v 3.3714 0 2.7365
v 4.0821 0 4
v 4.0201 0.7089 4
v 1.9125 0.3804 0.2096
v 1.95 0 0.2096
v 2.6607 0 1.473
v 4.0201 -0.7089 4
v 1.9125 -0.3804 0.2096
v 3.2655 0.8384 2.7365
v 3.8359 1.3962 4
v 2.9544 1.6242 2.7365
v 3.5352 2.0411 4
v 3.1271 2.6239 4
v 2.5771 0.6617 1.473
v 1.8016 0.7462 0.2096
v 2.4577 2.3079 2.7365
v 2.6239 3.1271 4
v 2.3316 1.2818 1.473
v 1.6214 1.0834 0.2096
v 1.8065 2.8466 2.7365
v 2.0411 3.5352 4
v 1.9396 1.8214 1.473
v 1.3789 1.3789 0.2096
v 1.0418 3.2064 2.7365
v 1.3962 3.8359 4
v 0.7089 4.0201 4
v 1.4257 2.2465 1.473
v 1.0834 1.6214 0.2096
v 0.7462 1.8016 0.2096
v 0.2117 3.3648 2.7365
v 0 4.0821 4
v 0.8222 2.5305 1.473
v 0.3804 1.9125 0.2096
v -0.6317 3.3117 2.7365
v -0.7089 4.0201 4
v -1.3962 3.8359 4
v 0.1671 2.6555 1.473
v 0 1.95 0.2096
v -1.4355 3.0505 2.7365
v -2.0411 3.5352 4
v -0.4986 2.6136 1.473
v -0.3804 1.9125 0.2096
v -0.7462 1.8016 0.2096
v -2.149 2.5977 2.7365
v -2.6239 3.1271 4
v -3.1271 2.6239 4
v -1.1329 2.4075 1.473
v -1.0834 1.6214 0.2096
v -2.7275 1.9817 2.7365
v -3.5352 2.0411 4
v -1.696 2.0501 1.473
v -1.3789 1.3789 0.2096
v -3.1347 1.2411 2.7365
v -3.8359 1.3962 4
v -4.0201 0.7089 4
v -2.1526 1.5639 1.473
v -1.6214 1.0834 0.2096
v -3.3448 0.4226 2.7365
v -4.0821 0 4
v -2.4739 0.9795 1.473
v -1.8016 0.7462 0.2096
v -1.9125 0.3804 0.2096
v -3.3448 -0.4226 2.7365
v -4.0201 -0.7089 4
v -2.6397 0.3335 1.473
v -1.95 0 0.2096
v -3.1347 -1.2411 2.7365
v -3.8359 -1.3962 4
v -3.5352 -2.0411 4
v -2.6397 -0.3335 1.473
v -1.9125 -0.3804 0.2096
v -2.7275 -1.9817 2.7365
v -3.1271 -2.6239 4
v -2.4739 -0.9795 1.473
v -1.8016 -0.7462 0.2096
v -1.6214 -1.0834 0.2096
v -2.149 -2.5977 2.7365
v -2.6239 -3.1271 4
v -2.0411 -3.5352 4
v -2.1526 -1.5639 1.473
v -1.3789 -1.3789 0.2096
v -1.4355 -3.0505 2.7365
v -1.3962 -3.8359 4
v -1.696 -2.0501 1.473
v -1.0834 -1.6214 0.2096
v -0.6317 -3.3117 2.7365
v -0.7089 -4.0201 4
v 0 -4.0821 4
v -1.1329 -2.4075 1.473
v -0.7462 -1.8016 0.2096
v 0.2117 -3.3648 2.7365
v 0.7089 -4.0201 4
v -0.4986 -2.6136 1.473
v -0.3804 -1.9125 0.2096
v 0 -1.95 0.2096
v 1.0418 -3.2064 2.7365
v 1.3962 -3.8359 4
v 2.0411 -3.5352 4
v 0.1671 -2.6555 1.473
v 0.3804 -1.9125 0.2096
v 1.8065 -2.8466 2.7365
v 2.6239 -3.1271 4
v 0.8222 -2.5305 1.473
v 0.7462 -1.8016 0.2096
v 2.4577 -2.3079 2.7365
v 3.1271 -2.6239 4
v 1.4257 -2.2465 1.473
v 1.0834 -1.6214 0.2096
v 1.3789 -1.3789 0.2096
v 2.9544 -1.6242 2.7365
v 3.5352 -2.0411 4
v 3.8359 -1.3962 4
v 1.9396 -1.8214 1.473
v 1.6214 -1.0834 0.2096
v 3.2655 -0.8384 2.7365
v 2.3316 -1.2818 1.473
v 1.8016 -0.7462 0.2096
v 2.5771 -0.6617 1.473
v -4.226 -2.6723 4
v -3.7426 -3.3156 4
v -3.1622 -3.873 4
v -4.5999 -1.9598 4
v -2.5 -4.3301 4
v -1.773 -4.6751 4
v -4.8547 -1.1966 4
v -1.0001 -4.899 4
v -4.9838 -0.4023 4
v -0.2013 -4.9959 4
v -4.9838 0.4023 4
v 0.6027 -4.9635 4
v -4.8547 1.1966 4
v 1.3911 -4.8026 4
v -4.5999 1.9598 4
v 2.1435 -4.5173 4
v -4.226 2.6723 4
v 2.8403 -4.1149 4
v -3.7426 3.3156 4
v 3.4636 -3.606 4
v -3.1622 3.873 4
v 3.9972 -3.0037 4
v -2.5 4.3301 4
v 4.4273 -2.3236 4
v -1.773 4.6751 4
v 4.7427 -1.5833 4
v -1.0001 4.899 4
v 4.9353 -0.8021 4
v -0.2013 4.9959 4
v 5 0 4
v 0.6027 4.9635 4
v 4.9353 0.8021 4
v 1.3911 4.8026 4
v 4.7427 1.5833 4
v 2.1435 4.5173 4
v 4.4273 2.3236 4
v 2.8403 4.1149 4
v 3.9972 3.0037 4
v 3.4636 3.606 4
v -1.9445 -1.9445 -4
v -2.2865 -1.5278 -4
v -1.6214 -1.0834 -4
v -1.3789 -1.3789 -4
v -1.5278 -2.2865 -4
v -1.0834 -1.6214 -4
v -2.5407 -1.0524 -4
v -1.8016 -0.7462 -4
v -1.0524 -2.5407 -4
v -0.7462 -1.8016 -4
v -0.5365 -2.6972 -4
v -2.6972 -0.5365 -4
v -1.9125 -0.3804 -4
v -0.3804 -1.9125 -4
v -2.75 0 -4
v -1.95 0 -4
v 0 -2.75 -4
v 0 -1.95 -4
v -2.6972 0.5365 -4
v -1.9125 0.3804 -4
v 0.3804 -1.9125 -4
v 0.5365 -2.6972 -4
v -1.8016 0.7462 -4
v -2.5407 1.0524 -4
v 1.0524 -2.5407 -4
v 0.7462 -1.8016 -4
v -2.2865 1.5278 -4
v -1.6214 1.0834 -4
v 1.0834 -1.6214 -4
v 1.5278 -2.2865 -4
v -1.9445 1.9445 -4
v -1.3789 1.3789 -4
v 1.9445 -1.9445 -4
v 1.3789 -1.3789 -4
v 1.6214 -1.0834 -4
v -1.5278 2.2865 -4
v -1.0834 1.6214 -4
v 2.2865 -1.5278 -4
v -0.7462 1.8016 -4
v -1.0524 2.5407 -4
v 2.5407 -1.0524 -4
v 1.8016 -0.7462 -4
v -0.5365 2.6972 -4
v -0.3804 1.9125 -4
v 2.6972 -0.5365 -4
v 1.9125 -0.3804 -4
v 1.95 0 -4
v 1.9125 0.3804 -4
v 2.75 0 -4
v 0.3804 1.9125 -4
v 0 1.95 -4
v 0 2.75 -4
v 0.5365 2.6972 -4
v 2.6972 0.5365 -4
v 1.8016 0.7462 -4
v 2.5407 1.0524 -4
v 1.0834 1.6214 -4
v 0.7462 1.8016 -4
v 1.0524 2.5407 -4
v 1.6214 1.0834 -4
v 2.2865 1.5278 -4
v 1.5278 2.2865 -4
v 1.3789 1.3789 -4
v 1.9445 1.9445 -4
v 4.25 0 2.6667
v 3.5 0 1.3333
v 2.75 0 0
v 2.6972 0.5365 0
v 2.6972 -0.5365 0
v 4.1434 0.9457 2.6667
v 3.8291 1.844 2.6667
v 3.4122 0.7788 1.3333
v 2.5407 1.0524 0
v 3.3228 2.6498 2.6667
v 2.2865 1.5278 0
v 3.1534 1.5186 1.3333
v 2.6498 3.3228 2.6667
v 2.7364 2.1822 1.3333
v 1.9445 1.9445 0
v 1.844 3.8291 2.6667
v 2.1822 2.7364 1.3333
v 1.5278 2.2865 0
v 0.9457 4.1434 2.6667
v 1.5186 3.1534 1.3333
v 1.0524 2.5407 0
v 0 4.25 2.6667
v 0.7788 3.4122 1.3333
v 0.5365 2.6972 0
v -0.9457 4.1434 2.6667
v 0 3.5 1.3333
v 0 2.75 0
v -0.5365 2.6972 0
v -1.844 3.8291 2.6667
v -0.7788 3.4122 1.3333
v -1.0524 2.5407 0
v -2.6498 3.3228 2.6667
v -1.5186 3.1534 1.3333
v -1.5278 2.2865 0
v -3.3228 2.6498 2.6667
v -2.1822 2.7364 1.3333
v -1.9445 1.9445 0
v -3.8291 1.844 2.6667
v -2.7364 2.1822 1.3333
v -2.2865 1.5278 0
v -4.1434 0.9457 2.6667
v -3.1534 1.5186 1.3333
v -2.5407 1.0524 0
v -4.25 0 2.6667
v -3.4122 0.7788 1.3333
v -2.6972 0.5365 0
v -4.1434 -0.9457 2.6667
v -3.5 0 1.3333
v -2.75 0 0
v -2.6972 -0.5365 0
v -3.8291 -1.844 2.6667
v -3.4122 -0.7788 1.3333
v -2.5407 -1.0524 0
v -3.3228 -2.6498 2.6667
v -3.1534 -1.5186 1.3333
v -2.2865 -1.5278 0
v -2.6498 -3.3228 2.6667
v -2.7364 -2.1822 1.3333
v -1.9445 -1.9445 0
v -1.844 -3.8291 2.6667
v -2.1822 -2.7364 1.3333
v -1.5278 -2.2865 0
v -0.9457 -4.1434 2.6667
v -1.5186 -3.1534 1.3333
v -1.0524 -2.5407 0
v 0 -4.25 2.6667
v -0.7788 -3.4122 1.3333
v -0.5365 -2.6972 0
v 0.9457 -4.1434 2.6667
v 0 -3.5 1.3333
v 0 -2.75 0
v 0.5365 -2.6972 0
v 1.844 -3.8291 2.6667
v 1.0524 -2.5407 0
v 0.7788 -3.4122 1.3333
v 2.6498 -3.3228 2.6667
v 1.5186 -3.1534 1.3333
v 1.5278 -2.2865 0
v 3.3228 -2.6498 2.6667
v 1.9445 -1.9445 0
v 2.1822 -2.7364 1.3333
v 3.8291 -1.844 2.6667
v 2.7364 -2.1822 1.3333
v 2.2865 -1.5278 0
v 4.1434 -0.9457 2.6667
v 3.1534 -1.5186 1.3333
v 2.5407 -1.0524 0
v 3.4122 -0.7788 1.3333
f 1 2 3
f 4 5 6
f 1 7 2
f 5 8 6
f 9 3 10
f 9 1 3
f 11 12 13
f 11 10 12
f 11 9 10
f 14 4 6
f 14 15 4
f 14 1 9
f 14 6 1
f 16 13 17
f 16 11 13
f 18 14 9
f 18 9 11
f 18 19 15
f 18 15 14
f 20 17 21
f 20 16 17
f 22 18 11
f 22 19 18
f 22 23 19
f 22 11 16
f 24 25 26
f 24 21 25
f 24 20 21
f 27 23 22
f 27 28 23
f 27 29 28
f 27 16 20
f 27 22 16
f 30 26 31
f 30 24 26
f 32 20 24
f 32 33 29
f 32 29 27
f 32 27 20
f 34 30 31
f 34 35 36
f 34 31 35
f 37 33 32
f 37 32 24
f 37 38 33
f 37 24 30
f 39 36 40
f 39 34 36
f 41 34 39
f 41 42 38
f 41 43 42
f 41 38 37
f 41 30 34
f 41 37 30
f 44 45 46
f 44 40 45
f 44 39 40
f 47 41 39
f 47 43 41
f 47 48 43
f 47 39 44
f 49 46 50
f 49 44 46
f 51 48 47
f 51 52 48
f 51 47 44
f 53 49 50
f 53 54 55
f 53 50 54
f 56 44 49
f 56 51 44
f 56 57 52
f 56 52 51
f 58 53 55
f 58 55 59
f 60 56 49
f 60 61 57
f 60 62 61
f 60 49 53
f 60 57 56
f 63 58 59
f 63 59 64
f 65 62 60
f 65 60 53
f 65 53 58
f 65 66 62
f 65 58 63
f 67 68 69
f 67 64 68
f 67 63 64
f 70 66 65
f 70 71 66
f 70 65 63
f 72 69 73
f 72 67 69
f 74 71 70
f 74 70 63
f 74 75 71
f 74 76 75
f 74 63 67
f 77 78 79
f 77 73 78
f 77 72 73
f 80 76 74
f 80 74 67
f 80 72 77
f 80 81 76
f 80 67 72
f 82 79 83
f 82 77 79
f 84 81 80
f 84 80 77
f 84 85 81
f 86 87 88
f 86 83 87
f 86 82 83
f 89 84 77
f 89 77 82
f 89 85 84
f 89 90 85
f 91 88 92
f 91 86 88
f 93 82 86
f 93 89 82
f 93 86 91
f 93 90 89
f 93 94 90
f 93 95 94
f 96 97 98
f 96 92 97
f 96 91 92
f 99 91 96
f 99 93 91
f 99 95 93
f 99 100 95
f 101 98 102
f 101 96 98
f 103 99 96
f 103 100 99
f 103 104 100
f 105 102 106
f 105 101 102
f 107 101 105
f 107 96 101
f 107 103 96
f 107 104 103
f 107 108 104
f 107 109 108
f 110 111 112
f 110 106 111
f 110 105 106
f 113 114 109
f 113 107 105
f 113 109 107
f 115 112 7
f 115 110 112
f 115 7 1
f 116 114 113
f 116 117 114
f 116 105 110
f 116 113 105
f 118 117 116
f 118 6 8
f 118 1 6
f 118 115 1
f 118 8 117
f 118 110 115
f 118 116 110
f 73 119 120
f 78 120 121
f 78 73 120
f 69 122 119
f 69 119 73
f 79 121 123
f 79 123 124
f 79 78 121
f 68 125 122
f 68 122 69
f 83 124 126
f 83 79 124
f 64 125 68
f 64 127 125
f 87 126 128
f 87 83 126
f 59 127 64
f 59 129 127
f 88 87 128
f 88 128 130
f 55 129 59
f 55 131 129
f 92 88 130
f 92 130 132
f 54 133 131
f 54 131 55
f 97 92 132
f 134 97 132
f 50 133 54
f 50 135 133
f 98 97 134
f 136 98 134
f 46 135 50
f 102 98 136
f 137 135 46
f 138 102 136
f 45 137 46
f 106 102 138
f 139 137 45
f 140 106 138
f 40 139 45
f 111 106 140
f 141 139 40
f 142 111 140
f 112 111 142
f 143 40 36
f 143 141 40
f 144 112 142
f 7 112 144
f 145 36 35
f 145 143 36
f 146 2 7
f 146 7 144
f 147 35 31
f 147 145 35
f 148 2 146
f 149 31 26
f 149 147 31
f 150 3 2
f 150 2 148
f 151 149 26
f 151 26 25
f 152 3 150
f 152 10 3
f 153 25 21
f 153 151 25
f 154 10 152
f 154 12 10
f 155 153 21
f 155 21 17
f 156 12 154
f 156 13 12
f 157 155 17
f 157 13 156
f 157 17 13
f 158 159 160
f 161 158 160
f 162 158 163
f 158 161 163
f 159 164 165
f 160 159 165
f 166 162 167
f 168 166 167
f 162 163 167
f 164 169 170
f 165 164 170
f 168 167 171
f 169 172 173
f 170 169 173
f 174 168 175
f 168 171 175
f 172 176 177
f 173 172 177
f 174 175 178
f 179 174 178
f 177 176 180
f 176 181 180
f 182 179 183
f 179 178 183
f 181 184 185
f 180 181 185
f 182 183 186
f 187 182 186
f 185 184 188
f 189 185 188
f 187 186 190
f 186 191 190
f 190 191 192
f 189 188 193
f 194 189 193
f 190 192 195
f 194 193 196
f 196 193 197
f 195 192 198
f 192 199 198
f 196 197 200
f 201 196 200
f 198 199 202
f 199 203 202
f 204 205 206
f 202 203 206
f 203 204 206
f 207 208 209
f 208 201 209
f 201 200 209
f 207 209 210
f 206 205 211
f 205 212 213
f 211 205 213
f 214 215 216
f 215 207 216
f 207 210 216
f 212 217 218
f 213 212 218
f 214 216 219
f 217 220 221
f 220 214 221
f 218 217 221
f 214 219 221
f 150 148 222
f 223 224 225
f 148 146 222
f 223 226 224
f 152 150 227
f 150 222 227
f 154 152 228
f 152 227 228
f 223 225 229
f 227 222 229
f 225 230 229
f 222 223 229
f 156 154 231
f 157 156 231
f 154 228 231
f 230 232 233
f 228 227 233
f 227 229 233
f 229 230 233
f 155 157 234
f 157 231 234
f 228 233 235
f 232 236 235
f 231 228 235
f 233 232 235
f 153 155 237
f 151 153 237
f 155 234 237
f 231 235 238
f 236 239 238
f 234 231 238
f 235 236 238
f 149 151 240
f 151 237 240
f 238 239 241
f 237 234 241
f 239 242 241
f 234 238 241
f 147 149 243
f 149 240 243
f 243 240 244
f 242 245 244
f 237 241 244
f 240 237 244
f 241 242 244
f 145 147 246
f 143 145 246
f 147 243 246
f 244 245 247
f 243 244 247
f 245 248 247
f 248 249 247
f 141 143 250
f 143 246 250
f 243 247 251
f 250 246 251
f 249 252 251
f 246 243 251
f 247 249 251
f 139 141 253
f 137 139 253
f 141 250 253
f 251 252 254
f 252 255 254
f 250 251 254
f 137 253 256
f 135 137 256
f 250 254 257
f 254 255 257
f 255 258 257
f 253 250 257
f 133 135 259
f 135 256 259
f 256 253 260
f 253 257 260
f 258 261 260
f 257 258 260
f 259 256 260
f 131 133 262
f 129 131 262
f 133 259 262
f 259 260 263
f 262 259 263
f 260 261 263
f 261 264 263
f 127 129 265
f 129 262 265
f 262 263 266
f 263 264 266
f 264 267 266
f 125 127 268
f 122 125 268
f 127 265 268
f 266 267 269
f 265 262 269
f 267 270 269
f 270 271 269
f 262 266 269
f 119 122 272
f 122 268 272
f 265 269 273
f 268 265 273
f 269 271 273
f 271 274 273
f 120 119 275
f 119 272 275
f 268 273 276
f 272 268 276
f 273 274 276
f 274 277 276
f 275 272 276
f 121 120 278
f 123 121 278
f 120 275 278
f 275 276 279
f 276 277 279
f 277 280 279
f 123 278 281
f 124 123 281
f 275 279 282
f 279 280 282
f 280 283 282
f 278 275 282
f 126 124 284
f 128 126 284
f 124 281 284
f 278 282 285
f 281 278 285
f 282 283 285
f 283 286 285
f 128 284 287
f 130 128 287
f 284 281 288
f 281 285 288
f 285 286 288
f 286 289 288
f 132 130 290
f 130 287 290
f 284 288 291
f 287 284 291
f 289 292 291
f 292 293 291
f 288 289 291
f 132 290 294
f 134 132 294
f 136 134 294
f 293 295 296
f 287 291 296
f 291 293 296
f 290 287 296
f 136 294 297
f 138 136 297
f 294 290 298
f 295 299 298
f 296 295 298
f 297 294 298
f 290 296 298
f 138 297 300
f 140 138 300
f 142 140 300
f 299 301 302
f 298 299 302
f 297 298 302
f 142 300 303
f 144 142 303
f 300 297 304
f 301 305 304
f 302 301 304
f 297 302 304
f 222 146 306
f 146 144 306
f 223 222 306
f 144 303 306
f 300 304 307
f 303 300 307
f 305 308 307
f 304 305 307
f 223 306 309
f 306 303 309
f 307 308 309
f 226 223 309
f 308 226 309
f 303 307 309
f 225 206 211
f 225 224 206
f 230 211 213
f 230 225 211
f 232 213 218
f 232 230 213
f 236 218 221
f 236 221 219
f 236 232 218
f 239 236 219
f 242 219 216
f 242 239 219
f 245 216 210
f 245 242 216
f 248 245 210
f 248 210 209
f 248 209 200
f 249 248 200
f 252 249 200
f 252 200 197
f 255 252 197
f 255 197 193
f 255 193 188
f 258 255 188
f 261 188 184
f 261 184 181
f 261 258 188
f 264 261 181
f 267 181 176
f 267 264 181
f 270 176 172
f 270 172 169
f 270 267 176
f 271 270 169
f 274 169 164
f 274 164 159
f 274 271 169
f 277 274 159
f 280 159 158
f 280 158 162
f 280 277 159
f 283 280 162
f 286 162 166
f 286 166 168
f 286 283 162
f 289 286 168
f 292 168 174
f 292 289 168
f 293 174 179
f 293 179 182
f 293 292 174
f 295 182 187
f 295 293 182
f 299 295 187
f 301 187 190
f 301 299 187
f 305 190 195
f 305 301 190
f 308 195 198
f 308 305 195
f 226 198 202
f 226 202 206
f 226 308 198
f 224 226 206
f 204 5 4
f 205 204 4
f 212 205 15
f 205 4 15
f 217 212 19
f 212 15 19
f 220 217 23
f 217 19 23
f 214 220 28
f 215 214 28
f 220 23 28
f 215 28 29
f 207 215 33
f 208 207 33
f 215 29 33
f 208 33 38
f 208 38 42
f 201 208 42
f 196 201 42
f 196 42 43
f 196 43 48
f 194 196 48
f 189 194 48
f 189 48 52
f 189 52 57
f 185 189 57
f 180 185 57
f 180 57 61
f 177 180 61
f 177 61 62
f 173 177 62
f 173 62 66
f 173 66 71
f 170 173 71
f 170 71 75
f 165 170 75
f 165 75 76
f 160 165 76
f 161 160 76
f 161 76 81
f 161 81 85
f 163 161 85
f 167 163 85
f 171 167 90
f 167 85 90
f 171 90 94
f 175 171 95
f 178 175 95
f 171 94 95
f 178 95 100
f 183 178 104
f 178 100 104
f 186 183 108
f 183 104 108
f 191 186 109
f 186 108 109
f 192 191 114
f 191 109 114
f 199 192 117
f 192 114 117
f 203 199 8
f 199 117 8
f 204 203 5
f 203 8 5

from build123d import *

# Parameters (mm, degrees)
F2_R      = 5
F0_R      = 2.75
F4_R      = 2.75
F6_FACE_R = 2.75
F8_T      = -0.8


with BuildPart() as f6:
    # F2 (on offset) → F6 section 0
    with BuildSketch(Plane.XY.offset(4)):
        Circle(F2_R)
    # F0 (on Top) → F6 section 1
    with BuildSketch(Plane.XY):
        Circle(F0_R)
    loft()

    # F4 (on offset) → F7 section 0
    with BuildSketch(Plane.XY.offset(-4)):
        Circle(F4_R)
    # F6_face (on face) → F7 section 1
    with BuildSketch(Plane(origin=(0, 0, 0), x_dir=(1, 0, 0), z_dir=(0, 0, -1))):
        Circle(F6_FACE_R)
    loft()

    # F8
    f8_openings = [f6.faces().sort_by_distance(p)[0] for p in [
        (0, 0, 4),
        (0, 0, -4),
    ]]
    offset(amount=F8_T, openings=f8_openings, kind=Kind.INTERSECTION)


solid = f6.part
